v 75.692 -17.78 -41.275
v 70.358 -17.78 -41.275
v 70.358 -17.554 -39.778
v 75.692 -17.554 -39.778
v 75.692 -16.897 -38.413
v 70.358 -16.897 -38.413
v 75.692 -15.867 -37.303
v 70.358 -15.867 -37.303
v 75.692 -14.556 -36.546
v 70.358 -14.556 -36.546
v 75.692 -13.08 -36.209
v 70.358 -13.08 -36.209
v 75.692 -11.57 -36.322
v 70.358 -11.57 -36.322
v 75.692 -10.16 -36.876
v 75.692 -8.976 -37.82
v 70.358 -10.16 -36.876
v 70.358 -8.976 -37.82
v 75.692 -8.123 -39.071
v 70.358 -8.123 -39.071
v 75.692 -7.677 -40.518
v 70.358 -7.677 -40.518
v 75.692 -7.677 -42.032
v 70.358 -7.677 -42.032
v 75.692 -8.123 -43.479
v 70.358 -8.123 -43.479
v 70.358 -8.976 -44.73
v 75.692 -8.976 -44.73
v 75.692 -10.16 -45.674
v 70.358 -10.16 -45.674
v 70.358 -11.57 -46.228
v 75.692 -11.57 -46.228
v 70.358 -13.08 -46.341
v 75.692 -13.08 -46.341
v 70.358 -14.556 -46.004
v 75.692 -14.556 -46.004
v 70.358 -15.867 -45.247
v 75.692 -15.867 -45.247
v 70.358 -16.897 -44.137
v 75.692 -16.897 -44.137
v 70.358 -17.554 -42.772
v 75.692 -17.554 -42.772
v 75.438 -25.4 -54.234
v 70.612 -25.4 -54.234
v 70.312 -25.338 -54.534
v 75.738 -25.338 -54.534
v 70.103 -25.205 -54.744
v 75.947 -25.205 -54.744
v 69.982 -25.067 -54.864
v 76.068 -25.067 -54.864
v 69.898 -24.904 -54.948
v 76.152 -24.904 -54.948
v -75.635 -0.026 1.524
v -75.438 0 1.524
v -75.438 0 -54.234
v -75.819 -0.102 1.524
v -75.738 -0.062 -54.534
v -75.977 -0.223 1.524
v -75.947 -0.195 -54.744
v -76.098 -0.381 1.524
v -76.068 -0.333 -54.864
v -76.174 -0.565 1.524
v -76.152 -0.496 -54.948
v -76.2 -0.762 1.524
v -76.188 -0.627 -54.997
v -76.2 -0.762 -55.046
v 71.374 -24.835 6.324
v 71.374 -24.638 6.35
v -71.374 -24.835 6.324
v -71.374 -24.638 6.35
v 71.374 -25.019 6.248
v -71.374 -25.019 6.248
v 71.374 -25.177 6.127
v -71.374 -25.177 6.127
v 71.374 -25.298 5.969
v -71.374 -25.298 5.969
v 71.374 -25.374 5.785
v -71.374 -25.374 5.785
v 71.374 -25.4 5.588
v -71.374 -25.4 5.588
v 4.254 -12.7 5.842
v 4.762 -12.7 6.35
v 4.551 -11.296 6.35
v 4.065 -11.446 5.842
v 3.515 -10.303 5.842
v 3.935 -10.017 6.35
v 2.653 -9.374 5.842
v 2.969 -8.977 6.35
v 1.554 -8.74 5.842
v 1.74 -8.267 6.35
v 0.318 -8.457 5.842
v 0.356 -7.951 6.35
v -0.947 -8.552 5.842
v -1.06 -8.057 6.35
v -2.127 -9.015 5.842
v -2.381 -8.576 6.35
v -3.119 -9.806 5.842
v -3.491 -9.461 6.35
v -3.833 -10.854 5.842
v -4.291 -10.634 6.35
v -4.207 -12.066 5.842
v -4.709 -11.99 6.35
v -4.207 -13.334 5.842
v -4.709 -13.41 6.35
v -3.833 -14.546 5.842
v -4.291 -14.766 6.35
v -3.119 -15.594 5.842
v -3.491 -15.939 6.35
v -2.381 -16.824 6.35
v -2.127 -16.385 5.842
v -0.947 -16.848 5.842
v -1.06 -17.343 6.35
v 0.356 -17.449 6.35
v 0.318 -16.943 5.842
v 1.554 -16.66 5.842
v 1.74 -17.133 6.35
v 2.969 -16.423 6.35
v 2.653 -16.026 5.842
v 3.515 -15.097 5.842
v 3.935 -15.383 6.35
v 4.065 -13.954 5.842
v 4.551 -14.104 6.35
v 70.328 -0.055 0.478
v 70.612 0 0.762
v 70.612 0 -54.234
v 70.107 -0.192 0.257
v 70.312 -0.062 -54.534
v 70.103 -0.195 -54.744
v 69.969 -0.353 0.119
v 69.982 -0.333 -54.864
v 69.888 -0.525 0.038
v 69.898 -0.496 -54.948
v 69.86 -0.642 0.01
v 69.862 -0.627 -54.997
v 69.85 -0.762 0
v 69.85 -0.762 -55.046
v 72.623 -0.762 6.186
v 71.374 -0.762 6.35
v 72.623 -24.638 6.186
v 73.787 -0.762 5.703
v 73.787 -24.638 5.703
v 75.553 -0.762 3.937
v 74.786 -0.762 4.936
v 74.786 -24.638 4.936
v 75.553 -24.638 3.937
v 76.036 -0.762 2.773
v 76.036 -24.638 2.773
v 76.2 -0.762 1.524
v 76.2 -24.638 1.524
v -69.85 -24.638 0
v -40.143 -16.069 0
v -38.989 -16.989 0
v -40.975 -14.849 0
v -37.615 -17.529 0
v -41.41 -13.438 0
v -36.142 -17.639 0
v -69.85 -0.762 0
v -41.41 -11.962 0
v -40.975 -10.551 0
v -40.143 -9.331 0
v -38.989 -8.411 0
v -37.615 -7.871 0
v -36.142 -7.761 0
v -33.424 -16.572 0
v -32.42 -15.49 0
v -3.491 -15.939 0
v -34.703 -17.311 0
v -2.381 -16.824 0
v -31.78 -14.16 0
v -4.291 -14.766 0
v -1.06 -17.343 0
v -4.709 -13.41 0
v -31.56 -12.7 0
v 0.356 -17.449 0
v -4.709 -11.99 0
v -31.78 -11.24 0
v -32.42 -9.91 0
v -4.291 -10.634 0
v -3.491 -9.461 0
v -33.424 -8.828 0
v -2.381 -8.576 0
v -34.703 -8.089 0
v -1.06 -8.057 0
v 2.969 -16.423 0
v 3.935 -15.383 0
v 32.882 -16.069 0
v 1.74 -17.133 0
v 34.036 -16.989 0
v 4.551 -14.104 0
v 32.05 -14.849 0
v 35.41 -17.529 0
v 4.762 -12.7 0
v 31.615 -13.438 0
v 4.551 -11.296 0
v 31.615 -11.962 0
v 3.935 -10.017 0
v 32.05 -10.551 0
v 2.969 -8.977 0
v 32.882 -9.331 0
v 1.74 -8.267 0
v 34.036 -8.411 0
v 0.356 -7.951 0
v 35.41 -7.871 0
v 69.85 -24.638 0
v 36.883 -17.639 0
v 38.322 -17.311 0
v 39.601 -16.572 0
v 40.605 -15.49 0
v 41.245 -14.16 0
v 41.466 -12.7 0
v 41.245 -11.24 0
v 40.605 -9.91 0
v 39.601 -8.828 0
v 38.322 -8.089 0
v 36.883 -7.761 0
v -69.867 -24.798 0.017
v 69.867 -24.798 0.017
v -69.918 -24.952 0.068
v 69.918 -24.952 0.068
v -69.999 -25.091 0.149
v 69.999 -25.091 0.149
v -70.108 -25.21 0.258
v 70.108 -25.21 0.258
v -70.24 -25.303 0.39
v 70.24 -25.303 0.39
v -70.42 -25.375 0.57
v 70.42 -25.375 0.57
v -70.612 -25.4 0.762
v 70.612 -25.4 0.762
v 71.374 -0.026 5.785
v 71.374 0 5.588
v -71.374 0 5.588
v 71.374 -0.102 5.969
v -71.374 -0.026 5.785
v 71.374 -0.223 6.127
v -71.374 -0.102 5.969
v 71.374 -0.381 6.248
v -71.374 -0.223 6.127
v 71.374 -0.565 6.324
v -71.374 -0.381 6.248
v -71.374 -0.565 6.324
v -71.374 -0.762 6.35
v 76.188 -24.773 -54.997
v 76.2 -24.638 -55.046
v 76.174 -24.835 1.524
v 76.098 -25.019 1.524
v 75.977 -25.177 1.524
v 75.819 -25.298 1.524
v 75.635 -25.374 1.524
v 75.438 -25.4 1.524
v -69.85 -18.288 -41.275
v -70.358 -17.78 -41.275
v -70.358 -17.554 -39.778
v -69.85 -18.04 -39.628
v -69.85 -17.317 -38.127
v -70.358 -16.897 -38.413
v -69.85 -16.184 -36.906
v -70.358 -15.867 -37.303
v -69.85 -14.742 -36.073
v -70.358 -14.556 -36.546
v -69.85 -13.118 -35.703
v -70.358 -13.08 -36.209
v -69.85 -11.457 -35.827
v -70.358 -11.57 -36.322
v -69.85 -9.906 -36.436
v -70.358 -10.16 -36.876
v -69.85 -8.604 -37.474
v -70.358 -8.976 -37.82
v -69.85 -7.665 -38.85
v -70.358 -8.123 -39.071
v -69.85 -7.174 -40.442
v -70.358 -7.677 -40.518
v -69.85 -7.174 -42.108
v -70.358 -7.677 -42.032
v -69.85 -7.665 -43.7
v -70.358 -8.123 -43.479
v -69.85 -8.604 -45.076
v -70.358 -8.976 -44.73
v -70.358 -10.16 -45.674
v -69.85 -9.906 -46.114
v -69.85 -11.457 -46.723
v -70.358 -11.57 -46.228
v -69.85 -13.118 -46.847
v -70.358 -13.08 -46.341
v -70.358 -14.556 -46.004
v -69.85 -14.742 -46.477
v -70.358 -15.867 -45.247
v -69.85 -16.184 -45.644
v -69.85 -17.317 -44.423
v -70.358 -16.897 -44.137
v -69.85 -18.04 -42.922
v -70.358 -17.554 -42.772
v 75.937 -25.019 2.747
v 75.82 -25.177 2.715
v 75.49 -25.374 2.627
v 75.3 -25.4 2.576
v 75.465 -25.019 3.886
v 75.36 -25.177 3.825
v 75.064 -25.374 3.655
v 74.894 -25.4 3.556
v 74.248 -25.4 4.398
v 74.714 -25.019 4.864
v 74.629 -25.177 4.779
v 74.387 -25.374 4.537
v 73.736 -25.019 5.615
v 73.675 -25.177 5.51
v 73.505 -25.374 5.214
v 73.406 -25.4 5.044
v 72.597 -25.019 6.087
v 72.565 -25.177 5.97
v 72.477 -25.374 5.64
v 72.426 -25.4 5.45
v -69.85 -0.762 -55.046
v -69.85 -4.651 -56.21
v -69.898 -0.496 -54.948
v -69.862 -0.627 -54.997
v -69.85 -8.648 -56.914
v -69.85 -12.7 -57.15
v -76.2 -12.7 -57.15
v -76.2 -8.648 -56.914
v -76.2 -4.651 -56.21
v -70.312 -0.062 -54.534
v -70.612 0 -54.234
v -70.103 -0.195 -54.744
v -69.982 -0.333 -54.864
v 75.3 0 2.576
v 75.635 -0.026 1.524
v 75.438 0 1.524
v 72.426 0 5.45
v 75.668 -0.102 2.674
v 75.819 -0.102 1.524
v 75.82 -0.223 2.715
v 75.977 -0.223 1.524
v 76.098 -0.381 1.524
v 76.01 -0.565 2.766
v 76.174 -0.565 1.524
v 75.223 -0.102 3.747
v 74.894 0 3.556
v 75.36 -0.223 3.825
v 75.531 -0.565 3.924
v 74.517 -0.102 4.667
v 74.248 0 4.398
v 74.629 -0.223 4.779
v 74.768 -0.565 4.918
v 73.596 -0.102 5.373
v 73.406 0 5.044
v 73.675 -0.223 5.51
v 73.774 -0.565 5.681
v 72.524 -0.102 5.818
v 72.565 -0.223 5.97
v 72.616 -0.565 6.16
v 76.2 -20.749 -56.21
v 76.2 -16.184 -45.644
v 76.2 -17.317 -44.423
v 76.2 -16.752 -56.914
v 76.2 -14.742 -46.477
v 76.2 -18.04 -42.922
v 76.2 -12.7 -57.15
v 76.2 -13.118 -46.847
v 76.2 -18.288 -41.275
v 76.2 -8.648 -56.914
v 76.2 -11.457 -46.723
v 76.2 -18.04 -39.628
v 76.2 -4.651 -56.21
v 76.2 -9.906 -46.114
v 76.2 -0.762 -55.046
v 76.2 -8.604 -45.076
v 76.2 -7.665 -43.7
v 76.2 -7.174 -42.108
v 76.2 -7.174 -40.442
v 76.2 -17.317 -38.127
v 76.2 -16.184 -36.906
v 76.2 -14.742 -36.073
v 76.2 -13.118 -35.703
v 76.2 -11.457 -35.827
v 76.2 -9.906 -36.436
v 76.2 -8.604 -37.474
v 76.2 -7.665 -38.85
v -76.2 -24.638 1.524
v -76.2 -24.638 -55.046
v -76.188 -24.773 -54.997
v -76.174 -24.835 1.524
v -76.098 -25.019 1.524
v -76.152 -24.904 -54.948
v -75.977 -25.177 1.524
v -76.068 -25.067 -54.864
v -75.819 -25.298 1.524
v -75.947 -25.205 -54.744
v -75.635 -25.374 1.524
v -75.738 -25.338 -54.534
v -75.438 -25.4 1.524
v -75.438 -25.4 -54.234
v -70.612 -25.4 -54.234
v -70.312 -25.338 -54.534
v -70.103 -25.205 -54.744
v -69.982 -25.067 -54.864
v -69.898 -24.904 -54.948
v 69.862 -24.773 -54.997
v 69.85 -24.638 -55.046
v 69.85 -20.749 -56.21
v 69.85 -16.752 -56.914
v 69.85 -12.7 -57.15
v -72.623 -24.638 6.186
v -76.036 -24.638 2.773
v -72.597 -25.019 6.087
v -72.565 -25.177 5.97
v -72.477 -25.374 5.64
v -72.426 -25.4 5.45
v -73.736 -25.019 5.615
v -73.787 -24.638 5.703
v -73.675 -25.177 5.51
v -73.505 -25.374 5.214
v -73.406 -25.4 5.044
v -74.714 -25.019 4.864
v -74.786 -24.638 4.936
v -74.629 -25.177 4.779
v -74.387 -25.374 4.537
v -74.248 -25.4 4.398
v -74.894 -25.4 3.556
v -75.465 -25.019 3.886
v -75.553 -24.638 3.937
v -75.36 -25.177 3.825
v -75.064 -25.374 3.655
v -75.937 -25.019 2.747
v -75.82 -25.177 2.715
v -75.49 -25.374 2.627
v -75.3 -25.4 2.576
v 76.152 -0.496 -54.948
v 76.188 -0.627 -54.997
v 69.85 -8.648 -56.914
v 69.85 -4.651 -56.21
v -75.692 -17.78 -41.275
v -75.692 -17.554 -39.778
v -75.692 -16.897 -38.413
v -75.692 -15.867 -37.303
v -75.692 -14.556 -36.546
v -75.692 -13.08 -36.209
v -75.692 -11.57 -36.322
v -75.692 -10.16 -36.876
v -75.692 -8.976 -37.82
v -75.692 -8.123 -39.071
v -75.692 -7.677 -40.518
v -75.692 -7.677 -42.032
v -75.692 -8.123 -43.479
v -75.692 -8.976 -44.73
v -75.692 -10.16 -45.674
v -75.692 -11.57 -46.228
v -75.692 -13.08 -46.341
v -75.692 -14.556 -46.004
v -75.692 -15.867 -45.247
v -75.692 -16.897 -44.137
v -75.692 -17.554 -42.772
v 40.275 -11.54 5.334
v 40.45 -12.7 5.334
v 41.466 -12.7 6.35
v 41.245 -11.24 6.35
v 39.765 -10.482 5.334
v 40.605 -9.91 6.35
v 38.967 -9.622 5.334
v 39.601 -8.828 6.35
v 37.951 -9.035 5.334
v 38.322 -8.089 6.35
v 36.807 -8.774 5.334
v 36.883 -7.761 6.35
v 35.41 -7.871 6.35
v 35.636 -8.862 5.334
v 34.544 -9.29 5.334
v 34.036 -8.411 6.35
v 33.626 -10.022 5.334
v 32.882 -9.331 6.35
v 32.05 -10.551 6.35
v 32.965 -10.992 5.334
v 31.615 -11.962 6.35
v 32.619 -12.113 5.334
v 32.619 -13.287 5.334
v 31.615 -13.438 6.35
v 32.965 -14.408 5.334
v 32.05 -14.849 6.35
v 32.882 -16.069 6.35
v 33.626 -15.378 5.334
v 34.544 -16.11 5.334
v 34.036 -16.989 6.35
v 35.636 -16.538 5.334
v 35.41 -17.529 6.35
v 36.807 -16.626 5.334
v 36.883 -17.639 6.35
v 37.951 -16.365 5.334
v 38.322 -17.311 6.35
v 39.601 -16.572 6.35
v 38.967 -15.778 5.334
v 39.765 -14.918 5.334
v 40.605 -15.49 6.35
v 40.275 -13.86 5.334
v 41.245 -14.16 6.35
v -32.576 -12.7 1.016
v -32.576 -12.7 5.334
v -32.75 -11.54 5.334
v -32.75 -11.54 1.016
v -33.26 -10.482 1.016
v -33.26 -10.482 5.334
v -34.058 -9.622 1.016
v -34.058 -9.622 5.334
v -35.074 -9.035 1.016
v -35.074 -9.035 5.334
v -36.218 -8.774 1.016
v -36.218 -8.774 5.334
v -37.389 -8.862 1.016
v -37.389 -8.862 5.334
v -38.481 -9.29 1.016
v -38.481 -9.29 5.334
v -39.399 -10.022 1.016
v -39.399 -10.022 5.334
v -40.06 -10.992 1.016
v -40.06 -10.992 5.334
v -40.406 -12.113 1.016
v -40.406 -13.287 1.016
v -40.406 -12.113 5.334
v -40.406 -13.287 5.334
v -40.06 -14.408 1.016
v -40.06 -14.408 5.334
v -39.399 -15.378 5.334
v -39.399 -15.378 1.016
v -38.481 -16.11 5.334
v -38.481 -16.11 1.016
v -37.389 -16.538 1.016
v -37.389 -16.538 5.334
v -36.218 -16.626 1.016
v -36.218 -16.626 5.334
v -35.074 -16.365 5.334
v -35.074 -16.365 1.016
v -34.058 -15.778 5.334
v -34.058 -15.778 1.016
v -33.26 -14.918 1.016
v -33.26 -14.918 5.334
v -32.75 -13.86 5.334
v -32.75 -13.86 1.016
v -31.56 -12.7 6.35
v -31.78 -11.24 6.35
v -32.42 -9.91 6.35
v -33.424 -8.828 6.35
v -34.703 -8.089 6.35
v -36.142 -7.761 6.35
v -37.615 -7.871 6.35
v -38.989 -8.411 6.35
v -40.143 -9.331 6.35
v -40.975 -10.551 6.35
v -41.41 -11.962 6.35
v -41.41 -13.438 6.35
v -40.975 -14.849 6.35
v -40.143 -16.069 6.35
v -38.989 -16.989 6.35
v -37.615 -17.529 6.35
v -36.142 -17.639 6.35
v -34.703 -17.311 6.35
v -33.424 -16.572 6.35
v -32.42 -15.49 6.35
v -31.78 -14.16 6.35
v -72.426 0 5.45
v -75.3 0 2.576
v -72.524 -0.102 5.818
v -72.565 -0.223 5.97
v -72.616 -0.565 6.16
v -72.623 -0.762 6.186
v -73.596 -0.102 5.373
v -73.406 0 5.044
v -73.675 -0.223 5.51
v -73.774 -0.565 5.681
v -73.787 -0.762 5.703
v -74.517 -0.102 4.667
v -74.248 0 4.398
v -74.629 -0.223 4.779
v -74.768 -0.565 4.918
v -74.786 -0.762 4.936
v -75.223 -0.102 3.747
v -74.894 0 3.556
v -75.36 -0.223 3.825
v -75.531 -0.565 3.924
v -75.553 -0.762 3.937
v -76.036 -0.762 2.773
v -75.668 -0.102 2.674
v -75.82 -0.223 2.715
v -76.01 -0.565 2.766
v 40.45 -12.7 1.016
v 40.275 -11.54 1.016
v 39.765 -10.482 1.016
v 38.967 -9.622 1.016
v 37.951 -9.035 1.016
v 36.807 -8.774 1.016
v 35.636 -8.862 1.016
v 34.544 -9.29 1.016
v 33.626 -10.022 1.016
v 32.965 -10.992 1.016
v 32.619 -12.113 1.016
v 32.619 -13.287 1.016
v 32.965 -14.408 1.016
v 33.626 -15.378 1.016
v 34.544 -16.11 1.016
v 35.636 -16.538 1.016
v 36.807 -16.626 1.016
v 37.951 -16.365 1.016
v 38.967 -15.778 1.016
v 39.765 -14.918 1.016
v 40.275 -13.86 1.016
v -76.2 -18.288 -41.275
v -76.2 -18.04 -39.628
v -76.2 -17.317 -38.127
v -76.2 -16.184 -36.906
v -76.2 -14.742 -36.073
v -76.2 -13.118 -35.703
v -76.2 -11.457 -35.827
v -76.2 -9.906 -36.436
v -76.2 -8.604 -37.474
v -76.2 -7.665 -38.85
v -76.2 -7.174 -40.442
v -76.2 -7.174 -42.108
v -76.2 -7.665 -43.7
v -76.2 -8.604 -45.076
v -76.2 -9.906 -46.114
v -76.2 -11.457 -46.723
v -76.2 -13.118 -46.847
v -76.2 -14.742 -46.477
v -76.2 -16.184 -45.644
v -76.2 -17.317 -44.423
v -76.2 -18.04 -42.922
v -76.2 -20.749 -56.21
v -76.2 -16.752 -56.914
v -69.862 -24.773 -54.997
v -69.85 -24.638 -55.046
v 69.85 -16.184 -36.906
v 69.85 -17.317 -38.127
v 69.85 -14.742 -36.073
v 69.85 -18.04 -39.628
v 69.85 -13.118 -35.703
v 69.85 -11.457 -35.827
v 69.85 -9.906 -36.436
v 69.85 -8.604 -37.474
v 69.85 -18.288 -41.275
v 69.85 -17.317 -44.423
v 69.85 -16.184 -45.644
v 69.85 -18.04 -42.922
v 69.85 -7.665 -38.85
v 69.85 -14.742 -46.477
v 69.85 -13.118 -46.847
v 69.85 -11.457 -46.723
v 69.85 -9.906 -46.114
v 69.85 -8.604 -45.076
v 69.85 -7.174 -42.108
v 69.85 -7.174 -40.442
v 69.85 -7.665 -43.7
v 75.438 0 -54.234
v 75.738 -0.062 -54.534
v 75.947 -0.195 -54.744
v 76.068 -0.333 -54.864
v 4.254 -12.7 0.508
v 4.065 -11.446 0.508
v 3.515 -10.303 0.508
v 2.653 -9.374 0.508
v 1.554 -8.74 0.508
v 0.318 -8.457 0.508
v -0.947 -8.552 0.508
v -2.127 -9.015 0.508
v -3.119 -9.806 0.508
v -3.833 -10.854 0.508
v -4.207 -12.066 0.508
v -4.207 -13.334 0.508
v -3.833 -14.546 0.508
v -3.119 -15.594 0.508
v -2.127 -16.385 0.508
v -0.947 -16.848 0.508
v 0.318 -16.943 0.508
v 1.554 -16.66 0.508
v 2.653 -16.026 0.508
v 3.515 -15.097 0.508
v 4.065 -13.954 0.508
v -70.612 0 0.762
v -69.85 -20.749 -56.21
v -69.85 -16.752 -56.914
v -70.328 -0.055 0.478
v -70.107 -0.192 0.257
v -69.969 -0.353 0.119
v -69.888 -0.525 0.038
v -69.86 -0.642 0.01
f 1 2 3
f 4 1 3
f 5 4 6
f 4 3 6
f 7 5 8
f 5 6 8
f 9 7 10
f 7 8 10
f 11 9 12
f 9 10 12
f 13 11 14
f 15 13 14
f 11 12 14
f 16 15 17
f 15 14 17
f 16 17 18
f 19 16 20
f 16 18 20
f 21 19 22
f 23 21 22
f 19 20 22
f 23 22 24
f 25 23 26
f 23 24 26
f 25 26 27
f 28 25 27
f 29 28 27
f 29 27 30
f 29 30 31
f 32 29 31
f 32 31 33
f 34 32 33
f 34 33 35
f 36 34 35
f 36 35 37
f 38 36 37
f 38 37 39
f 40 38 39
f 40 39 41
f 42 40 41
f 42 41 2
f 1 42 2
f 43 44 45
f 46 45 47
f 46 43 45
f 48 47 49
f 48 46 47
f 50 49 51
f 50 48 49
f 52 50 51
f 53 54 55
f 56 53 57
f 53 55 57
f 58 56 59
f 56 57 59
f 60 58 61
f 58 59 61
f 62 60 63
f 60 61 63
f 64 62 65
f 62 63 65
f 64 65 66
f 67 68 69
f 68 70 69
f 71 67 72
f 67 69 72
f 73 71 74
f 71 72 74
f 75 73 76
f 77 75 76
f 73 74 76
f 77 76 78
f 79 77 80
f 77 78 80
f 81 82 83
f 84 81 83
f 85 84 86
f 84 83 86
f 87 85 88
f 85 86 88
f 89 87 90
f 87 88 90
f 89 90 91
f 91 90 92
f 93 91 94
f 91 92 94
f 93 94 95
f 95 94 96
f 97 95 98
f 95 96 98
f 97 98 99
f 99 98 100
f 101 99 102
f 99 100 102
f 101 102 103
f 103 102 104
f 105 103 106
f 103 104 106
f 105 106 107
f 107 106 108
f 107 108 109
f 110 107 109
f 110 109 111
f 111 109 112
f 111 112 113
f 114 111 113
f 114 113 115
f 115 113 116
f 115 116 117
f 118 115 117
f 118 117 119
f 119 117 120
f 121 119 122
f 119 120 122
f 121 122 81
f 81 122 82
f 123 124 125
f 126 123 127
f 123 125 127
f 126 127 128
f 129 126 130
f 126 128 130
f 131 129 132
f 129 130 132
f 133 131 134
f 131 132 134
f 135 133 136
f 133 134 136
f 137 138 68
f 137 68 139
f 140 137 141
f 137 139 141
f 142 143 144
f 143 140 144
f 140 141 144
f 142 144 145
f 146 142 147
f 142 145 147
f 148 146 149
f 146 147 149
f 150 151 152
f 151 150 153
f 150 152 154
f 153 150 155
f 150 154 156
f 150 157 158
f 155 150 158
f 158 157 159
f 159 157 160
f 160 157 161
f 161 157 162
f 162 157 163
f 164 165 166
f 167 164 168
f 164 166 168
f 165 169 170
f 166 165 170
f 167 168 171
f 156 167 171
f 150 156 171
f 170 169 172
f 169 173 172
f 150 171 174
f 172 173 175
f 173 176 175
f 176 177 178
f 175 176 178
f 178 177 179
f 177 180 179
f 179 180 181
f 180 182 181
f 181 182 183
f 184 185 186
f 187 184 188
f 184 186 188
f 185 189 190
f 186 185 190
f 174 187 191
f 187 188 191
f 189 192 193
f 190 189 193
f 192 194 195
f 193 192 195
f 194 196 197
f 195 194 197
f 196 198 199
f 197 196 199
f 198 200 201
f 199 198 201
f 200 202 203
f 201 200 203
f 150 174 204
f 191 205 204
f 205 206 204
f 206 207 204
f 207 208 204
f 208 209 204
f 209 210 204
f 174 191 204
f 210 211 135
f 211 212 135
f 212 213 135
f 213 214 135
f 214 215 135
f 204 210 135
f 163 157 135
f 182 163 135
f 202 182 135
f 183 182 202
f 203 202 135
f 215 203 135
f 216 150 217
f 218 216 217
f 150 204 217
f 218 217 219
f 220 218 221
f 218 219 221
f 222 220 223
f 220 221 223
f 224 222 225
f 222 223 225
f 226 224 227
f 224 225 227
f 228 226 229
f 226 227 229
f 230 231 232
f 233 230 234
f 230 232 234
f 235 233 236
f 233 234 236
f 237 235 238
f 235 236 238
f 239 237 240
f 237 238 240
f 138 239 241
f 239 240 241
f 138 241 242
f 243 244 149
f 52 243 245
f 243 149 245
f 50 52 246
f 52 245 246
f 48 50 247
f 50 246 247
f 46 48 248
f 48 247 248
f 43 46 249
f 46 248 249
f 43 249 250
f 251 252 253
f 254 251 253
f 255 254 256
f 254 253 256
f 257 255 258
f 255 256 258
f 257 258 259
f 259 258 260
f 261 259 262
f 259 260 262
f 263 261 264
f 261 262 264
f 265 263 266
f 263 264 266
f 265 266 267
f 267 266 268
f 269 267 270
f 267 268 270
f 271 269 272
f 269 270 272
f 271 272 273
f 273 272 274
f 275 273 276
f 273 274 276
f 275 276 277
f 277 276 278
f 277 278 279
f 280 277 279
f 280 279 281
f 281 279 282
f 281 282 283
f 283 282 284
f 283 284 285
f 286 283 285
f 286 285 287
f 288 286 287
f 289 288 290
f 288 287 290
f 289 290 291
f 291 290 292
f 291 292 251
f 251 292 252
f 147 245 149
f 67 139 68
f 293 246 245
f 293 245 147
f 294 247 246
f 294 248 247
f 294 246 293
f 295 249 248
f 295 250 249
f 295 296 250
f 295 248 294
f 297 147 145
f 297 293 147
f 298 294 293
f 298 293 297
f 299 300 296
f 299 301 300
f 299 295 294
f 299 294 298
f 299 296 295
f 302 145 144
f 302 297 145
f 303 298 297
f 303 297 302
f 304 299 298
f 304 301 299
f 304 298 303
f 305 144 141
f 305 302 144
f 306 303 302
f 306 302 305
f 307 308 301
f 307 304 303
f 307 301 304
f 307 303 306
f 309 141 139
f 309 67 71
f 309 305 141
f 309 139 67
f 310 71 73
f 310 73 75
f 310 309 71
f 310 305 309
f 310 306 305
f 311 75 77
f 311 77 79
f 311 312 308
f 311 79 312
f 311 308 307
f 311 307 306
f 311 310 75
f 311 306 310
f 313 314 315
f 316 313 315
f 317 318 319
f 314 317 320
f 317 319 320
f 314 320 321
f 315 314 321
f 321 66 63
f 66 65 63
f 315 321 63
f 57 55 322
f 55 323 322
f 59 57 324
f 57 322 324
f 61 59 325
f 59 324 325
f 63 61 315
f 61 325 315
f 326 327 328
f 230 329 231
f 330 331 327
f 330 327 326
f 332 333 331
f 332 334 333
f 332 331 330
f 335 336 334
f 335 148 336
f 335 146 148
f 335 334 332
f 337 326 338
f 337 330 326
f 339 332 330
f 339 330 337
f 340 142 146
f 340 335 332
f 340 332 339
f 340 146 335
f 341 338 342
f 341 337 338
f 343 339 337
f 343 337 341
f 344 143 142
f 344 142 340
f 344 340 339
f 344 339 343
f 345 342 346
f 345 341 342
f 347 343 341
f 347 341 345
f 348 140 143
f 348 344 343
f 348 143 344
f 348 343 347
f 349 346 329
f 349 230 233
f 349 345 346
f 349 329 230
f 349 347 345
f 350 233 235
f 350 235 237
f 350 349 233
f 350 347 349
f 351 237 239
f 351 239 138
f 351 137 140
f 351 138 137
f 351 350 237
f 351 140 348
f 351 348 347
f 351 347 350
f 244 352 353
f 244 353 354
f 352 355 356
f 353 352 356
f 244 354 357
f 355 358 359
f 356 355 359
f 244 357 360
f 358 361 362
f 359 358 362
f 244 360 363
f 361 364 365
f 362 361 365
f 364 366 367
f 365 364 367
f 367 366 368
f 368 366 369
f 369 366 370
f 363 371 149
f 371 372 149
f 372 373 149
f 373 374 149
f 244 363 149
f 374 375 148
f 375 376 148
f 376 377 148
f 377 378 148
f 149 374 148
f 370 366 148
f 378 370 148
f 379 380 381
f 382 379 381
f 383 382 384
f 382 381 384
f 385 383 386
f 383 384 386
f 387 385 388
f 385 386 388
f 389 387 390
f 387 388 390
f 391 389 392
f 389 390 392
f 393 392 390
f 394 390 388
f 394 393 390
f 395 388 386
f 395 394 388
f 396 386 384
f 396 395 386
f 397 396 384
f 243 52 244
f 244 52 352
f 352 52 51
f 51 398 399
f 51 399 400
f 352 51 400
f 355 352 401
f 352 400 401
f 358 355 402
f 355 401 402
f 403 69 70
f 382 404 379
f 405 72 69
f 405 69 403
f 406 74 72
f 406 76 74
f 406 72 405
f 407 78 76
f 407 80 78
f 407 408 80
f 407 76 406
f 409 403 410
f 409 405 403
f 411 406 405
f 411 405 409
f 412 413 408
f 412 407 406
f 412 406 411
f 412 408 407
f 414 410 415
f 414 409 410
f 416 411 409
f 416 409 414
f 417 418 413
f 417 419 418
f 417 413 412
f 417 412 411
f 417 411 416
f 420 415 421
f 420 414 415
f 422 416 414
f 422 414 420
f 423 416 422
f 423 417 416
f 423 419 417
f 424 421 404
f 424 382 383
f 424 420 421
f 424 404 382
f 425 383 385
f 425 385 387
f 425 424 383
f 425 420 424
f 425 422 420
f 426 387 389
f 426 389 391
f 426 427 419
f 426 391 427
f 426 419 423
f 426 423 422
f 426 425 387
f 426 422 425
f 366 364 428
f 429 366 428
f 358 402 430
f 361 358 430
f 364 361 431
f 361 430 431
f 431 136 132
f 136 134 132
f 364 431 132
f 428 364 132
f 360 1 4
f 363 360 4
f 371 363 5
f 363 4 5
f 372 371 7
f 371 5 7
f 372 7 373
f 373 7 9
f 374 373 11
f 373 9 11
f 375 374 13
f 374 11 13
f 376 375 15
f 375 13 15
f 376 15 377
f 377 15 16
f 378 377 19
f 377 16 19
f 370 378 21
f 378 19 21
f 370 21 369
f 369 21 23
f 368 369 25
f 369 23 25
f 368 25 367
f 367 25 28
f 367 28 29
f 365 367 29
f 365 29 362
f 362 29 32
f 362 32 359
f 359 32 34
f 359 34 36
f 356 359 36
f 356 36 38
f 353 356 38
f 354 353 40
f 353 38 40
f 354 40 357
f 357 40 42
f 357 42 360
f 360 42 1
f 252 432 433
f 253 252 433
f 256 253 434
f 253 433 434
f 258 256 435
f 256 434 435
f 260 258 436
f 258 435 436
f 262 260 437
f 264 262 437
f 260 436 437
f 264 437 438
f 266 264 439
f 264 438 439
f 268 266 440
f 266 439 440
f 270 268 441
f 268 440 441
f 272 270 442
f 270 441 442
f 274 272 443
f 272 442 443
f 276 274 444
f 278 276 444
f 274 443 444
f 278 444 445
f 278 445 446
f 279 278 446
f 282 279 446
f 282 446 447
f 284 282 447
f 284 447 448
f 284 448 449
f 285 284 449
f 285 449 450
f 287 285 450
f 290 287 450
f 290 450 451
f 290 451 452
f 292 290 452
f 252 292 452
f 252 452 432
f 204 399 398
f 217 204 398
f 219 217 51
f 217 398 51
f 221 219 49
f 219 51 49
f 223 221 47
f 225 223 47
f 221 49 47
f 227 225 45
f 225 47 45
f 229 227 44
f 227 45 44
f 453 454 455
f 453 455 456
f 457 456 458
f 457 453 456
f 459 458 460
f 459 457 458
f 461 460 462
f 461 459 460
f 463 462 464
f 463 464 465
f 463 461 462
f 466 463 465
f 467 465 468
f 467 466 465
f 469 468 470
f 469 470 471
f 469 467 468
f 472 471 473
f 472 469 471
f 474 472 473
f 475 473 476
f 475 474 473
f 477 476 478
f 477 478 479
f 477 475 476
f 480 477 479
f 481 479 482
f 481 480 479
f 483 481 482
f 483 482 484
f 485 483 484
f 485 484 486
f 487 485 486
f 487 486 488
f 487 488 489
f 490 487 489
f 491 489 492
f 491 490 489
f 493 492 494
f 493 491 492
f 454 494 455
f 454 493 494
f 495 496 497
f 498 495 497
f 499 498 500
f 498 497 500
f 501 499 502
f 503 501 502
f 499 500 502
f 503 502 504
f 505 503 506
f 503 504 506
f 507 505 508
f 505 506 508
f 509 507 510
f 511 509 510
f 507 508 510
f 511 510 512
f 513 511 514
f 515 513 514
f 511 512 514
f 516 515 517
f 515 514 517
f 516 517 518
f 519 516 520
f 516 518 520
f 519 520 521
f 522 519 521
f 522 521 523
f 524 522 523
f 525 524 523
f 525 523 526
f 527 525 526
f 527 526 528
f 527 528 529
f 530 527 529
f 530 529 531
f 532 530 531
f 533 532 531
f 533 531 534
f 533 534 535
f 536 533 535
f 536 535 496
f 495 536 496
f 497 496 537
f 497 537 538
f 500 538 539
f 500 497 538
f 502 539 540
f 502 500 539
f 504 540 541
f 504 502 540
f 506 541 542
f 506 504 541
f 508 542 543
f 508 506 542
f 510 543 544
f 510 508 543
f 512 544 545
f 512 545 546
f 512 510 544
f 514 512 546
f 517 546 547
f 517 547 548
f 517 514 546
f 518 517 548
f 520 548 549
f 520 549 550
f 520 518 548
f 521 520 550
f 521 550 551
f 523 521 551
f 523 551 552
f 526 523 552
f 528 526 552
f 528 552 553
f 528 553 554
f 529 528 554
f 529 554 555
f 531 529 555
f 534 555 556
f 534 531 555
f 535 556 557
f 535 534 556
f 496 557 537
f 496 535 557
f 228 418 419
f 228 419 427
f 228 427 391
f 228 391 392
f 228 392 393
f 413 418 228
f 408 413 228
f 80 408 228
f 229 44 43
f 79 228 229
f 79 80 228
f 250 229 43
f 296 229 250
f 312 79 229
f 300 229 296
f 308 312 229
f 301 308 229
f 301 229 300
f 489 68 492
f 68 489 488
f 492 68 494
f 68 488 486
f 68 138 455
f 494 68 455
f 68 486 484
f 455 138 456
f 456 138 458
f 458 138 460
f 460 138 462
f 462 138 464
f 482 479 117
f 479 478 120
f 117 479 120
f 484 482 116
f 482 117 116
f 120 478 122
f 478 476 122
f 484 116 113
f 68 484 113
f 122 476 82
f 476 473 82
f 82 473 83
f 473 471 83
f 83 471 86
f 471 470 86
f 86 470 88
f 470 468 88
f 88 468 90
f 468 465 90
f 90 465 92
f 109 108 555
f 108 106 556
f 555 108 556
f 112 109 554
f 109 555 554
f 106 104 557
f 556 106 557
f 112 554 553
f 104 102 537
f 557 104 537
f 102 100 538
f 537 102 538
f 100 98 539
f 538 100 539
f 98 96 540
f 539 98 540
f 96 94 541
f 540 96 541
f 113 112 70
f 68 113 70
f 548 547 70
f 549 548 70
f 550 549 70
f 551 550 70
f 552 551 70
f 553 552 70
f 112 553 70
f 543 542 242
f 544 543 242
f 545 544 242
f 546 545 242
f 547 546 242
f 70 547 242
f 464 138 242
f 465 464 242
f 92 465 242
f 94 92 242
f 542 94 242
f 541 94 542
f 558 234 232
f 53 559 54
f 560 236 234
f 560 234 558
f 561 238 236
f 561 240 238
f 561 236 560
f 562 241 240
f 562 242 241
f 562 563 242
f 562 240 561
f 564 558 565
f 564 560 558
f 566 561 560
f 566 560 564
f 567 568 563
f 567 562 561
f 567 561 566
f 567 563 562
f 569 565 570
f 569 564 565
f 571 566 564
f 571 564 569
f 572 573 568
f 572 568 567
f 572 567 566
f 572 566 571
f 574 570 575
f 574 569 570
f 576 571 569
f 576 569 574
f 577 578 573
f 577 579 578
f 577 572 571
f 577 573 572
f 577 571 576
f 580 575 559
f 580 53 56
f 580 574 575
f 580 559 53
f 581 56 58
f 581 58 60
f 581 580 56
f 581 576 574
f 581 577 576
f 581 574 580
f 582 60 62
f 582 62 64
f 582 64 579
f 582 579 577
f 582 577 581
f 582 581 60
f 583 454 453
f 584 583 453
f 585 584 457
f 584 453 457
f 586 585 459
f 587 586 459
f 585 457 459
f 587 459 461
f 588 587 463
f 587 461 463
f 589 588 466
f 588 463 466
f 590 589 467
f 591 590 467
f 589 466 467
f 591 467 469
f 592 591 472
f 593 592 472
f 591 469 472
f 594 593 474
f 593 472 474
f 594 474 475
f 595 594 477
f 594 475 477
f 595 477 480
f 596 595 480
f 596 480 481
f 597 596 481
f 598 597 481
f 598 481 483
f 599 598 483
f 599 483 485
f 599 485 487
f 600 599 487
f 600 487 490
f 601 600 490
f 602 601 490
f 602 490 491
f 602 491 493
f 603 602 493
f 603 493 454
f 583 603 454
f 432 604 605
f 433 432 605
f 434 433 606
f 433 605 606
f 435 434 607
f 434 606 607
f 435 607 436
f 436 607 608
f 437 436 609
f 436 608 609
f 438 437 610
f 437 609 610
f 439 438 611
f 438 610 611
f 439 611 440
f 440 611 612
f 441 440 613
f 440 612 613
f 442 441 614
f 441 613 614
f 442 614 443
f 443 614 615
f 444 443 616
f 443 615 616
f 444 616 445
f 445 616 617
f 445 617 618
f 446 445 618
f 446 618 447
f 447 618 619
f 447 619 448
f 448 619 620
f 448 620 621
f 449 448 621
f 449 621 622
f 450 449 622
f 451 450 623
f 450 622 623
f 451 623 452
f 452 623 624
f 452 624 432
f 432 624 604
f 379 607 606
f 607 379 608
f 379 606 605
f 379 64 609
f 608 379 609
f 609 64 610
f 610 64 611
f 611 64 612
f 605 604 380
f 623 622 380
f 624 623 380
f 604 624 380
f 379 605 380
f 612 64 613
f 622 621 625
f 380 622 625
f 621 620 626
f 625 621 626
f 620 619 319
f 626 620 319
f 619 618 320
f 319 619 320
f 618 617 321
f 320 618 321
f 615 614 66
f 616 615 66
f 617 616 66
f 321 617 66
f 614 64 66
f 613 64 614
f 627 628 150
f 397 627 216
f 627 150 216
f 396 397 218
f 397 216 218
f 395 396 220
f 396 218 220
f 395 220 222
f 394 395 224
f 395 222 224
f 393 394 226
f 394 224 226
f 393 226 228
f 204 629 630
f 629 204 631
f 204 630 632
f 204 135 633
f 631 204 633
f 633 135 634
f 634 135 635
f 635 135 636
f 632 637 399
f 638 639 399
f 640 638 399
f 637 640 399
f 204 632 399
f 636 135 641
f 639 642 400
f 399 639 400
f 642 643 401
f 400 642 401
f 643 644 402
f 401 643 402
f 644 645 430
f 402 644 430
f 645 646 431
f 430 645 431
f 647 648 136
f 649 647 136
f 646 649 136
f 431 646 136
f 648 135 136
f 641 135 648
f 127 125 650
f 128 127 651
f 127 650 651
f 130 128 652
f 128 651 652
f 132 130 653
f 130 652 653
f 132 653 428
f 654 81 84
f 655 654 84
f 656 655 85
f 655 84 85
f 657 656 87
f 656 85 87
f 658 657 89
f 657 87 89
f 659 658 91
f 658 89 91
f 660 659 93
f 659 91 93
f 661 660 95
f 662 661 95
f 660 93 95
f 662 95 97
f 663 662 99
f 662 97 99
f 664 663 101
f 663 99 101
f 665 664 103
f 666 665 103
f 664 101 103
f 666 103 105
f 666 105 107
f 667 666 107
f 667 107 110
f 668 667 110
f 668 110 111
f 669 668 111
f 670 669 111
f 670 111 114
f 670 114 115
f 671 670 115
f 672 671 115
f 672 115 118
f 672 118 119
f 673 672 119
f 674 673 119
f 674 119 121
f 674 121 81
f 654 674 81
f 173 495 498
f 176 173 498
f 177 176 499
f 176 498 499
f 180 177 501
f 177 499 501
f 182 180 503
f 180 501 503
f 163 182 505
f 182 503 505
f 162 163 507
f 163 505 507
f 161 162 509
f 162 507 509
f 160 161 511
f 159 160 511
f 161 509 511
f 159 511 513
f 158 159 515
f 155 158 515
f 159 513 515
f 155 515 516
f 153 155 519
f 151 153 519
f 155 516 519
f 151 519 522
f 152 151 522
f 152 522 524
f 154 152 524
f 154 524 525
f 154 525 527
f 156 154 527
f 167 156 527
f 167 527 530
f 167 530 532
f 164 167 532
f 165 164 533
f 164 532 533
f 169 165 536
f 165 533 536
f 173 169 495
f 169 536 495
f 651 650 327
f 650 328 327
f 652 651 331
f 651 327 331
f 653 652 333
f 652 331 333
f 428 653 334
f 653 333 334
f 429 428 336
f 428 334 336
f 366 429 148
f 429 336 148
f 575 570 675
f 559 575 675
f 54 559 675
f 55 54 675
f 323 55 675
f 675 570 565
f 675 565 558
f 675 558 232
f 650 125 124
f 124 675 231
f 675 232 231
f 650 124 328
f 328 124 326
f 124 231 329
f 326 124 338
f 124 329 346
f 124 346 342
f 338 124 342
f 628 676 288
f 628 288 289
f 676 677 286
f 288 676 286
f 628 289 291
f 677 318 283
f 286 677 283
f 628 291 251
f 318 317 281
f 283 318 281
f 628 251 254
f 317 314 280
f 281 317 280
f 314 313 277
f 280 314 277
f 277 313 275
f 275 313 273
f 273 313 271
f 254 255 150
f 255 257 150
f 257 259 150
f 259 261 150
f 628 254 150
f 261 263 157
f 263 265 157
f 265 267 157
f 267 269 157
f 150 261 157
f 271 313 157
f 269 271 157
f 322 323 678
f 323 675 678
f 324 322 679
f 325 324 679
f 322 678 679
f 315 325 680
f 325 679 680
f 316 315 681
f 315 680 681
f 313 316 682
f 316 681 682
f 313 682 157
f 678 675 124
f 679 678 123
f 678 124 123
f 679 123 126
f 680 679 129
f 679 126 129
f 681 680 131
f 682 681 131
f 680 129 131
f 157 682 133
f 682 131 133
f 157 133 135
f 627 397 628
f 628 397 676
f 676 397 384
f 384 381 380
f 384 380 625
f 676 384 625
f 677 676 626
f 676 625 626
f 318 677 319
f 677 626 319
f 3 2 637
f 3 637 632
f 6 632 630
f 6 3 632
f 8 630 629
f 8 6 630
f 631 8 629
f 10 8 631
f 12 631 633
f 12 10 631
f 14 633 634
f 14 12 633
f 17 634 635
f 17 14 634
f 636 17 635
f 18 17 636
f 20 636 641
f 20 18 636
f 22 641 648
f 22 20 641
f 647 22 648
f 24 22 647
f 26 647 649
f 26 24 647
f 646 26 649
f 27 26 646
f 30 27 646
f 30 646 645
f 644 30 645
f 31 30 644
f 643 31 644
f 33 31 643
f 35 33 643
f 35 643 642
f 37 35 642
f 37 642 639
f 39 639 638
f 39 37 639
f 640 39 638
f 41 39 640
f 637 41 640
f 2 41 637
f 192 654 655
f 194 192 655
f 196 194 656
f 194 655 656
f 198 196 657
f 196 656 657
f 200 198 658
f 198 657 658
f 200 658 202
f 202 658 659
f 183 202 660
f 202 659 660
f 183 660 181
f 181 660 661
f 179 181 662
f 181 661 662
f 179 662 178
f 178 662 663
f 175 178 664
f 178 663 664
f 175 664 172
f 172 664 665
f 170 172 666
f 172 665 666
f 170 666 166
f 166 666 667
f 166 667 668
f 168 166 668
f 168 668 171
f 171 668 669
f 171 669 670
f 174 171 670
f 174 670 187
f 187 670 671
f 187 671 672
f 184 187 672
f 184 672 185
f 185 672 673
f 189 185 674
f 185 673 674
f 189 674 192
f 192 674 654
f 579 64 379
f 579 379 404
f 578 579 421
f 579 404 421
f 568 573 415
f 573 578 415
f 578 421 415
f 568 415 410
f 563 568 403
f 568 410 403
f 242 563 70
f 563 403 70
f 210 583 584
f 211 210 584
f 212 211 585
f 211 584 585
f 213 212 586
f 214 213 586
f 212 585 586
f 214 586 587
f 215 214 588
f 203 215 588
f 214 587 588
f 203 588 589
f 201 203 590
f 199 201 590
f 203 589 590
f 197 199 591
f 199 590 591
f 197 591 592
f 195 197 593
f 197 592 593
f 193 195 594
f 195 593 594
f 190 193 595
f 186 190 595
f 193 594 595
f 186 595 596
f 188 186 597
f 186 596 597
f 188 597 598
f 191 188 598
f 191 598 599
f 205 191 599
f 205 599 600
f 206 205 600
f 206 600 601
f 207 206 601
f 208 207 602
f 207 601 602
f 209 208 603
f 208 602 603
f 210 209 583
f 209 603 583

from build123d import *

# Parameters (mm, degrees)
F1_DEPTH = 25.4
F2_R     = 5.08
F3_DEPTH = 152.401
F4_R     = 3.937
F4_R_2   = 4.2545
F5_DEPTH = 63.501
F6_SIZE  = 1.016
F7_SIZE  = 0.508
F8_R     = 4.826
F9_R     = 0.762


with BuildPart() as f1:
    # F0 (on Front) → F1 (new body)
    with BuildSketch(Plane.XZ):
        Polygon((-69.85, -57.15), (-69.85, 0), (0, 0), (69.85, 0), (69.85, -57.15), (76.2, -57.15), (76.2, 6.35), (0, 6.35), (-76.2, 6.35), (-76.2, -57.15), align=None)
    extrude(amount=F1_DEPTH)

    # F2 (on face) → F3 (cut, through all)
    with BuildSketch(Plane(origin=(-76.2, 0, 0), x_dir=(0, -1, 0), z_dir=(-1, 0, 0))):
        with Locations((12.7, -41.275)):
            Circle(F2_R)
        with BuildLine():
            ThreePointArc((25.4, -54.7590686819), (19.1615507536, -56.5470626836), (12.7, -57.15))
            Line((12.7, -57.15), (25.4, -57.15))
            Line((25.4, -57.15), (25.4, -54.7590686819))
        make_face()
        with BuildLine():
            ThreePointArc((12.7, -57.15), (6.2384492464, -56.5470626836), (0, -54.7590686819))
            Line((0, -54.7590686819), (0, -57.15))
            Line((0, -57.15), (12.7, -57.15))
        make_face()
    extrude(amount=-F3_DEPTH, mode=Mode.SUBTRACT)

    # F4 (on face) → F5 (cut, through all)
    with BuildSketch(Plane.XY.offset(6.35)):
        with Locations((-36.5125, -12.7)):
            Circle(F4_R)
        with Locations((0, -12.7)):
            Circle(F4_R_2)
        with Locations((36.5125, -12.7)):
            Circle(F4_R)
    extrude(amount=-F5_DEPTH, mode=Mode.SUBTRACT)

    # F6
    f6_edges = [f1.edges().sort_by_distance(p)[0] for p in [
        (-40.4495, -12.7, 6.35),
        (32.5755, -12.7, 6.35),
        (32.5755, -12.7, 0),
        (-40.4495, -12.7, 0),
    ]]
    chamfer(f6_edges, length=F6_SIZE)

    # F7
    f7_edges = [f1.edges().sort_by_distance(p)[0] for p in [
        (-4.2545, -12.7, 6.35),
        (-4.2545, -12.7, 0),
        (-69.85, -7.62, -41.275),
        (69.85, -7.62, -41.275),
        (76.2, -7.62, -41.275),
        (-76.2, -7.62, -41.275),
    ]]
    chamfer(f7_edges, length=F7_SIZE)

    # F8
    f8_edges = [f1.edges().sort_by_distance(p)[0] for p in [
        (-76.2, -12.7, 6.35),
        (76.2, -12.7, 6.35),
    ]]
    fillet(f8_edges, radius=F8_R)

    # F9
    f9_edges = [f1.edges().sort_by_distance(p)[0] for p in [
        (0, -25.4, 6.35),
        (-73.025, -25.4, -54.759069),
        (-69.85, -25.4, -27.379534),
        (0, -25.4, 0),
        (69.85, -25.4, -27.379534),
        (73.025, -25.4, -54.759069),
        (0, 0, 6.35),
        (69.85, 0, -27.379534),
        (0, 0, 0),
        (-69.85, 0, -27.379534),
        (73.025, 0, -54.759069),
        (-73.025, 0, -54.759069),
    ]]
    fillet(f9_edges, radius=F9_R)


solid = f1.part
